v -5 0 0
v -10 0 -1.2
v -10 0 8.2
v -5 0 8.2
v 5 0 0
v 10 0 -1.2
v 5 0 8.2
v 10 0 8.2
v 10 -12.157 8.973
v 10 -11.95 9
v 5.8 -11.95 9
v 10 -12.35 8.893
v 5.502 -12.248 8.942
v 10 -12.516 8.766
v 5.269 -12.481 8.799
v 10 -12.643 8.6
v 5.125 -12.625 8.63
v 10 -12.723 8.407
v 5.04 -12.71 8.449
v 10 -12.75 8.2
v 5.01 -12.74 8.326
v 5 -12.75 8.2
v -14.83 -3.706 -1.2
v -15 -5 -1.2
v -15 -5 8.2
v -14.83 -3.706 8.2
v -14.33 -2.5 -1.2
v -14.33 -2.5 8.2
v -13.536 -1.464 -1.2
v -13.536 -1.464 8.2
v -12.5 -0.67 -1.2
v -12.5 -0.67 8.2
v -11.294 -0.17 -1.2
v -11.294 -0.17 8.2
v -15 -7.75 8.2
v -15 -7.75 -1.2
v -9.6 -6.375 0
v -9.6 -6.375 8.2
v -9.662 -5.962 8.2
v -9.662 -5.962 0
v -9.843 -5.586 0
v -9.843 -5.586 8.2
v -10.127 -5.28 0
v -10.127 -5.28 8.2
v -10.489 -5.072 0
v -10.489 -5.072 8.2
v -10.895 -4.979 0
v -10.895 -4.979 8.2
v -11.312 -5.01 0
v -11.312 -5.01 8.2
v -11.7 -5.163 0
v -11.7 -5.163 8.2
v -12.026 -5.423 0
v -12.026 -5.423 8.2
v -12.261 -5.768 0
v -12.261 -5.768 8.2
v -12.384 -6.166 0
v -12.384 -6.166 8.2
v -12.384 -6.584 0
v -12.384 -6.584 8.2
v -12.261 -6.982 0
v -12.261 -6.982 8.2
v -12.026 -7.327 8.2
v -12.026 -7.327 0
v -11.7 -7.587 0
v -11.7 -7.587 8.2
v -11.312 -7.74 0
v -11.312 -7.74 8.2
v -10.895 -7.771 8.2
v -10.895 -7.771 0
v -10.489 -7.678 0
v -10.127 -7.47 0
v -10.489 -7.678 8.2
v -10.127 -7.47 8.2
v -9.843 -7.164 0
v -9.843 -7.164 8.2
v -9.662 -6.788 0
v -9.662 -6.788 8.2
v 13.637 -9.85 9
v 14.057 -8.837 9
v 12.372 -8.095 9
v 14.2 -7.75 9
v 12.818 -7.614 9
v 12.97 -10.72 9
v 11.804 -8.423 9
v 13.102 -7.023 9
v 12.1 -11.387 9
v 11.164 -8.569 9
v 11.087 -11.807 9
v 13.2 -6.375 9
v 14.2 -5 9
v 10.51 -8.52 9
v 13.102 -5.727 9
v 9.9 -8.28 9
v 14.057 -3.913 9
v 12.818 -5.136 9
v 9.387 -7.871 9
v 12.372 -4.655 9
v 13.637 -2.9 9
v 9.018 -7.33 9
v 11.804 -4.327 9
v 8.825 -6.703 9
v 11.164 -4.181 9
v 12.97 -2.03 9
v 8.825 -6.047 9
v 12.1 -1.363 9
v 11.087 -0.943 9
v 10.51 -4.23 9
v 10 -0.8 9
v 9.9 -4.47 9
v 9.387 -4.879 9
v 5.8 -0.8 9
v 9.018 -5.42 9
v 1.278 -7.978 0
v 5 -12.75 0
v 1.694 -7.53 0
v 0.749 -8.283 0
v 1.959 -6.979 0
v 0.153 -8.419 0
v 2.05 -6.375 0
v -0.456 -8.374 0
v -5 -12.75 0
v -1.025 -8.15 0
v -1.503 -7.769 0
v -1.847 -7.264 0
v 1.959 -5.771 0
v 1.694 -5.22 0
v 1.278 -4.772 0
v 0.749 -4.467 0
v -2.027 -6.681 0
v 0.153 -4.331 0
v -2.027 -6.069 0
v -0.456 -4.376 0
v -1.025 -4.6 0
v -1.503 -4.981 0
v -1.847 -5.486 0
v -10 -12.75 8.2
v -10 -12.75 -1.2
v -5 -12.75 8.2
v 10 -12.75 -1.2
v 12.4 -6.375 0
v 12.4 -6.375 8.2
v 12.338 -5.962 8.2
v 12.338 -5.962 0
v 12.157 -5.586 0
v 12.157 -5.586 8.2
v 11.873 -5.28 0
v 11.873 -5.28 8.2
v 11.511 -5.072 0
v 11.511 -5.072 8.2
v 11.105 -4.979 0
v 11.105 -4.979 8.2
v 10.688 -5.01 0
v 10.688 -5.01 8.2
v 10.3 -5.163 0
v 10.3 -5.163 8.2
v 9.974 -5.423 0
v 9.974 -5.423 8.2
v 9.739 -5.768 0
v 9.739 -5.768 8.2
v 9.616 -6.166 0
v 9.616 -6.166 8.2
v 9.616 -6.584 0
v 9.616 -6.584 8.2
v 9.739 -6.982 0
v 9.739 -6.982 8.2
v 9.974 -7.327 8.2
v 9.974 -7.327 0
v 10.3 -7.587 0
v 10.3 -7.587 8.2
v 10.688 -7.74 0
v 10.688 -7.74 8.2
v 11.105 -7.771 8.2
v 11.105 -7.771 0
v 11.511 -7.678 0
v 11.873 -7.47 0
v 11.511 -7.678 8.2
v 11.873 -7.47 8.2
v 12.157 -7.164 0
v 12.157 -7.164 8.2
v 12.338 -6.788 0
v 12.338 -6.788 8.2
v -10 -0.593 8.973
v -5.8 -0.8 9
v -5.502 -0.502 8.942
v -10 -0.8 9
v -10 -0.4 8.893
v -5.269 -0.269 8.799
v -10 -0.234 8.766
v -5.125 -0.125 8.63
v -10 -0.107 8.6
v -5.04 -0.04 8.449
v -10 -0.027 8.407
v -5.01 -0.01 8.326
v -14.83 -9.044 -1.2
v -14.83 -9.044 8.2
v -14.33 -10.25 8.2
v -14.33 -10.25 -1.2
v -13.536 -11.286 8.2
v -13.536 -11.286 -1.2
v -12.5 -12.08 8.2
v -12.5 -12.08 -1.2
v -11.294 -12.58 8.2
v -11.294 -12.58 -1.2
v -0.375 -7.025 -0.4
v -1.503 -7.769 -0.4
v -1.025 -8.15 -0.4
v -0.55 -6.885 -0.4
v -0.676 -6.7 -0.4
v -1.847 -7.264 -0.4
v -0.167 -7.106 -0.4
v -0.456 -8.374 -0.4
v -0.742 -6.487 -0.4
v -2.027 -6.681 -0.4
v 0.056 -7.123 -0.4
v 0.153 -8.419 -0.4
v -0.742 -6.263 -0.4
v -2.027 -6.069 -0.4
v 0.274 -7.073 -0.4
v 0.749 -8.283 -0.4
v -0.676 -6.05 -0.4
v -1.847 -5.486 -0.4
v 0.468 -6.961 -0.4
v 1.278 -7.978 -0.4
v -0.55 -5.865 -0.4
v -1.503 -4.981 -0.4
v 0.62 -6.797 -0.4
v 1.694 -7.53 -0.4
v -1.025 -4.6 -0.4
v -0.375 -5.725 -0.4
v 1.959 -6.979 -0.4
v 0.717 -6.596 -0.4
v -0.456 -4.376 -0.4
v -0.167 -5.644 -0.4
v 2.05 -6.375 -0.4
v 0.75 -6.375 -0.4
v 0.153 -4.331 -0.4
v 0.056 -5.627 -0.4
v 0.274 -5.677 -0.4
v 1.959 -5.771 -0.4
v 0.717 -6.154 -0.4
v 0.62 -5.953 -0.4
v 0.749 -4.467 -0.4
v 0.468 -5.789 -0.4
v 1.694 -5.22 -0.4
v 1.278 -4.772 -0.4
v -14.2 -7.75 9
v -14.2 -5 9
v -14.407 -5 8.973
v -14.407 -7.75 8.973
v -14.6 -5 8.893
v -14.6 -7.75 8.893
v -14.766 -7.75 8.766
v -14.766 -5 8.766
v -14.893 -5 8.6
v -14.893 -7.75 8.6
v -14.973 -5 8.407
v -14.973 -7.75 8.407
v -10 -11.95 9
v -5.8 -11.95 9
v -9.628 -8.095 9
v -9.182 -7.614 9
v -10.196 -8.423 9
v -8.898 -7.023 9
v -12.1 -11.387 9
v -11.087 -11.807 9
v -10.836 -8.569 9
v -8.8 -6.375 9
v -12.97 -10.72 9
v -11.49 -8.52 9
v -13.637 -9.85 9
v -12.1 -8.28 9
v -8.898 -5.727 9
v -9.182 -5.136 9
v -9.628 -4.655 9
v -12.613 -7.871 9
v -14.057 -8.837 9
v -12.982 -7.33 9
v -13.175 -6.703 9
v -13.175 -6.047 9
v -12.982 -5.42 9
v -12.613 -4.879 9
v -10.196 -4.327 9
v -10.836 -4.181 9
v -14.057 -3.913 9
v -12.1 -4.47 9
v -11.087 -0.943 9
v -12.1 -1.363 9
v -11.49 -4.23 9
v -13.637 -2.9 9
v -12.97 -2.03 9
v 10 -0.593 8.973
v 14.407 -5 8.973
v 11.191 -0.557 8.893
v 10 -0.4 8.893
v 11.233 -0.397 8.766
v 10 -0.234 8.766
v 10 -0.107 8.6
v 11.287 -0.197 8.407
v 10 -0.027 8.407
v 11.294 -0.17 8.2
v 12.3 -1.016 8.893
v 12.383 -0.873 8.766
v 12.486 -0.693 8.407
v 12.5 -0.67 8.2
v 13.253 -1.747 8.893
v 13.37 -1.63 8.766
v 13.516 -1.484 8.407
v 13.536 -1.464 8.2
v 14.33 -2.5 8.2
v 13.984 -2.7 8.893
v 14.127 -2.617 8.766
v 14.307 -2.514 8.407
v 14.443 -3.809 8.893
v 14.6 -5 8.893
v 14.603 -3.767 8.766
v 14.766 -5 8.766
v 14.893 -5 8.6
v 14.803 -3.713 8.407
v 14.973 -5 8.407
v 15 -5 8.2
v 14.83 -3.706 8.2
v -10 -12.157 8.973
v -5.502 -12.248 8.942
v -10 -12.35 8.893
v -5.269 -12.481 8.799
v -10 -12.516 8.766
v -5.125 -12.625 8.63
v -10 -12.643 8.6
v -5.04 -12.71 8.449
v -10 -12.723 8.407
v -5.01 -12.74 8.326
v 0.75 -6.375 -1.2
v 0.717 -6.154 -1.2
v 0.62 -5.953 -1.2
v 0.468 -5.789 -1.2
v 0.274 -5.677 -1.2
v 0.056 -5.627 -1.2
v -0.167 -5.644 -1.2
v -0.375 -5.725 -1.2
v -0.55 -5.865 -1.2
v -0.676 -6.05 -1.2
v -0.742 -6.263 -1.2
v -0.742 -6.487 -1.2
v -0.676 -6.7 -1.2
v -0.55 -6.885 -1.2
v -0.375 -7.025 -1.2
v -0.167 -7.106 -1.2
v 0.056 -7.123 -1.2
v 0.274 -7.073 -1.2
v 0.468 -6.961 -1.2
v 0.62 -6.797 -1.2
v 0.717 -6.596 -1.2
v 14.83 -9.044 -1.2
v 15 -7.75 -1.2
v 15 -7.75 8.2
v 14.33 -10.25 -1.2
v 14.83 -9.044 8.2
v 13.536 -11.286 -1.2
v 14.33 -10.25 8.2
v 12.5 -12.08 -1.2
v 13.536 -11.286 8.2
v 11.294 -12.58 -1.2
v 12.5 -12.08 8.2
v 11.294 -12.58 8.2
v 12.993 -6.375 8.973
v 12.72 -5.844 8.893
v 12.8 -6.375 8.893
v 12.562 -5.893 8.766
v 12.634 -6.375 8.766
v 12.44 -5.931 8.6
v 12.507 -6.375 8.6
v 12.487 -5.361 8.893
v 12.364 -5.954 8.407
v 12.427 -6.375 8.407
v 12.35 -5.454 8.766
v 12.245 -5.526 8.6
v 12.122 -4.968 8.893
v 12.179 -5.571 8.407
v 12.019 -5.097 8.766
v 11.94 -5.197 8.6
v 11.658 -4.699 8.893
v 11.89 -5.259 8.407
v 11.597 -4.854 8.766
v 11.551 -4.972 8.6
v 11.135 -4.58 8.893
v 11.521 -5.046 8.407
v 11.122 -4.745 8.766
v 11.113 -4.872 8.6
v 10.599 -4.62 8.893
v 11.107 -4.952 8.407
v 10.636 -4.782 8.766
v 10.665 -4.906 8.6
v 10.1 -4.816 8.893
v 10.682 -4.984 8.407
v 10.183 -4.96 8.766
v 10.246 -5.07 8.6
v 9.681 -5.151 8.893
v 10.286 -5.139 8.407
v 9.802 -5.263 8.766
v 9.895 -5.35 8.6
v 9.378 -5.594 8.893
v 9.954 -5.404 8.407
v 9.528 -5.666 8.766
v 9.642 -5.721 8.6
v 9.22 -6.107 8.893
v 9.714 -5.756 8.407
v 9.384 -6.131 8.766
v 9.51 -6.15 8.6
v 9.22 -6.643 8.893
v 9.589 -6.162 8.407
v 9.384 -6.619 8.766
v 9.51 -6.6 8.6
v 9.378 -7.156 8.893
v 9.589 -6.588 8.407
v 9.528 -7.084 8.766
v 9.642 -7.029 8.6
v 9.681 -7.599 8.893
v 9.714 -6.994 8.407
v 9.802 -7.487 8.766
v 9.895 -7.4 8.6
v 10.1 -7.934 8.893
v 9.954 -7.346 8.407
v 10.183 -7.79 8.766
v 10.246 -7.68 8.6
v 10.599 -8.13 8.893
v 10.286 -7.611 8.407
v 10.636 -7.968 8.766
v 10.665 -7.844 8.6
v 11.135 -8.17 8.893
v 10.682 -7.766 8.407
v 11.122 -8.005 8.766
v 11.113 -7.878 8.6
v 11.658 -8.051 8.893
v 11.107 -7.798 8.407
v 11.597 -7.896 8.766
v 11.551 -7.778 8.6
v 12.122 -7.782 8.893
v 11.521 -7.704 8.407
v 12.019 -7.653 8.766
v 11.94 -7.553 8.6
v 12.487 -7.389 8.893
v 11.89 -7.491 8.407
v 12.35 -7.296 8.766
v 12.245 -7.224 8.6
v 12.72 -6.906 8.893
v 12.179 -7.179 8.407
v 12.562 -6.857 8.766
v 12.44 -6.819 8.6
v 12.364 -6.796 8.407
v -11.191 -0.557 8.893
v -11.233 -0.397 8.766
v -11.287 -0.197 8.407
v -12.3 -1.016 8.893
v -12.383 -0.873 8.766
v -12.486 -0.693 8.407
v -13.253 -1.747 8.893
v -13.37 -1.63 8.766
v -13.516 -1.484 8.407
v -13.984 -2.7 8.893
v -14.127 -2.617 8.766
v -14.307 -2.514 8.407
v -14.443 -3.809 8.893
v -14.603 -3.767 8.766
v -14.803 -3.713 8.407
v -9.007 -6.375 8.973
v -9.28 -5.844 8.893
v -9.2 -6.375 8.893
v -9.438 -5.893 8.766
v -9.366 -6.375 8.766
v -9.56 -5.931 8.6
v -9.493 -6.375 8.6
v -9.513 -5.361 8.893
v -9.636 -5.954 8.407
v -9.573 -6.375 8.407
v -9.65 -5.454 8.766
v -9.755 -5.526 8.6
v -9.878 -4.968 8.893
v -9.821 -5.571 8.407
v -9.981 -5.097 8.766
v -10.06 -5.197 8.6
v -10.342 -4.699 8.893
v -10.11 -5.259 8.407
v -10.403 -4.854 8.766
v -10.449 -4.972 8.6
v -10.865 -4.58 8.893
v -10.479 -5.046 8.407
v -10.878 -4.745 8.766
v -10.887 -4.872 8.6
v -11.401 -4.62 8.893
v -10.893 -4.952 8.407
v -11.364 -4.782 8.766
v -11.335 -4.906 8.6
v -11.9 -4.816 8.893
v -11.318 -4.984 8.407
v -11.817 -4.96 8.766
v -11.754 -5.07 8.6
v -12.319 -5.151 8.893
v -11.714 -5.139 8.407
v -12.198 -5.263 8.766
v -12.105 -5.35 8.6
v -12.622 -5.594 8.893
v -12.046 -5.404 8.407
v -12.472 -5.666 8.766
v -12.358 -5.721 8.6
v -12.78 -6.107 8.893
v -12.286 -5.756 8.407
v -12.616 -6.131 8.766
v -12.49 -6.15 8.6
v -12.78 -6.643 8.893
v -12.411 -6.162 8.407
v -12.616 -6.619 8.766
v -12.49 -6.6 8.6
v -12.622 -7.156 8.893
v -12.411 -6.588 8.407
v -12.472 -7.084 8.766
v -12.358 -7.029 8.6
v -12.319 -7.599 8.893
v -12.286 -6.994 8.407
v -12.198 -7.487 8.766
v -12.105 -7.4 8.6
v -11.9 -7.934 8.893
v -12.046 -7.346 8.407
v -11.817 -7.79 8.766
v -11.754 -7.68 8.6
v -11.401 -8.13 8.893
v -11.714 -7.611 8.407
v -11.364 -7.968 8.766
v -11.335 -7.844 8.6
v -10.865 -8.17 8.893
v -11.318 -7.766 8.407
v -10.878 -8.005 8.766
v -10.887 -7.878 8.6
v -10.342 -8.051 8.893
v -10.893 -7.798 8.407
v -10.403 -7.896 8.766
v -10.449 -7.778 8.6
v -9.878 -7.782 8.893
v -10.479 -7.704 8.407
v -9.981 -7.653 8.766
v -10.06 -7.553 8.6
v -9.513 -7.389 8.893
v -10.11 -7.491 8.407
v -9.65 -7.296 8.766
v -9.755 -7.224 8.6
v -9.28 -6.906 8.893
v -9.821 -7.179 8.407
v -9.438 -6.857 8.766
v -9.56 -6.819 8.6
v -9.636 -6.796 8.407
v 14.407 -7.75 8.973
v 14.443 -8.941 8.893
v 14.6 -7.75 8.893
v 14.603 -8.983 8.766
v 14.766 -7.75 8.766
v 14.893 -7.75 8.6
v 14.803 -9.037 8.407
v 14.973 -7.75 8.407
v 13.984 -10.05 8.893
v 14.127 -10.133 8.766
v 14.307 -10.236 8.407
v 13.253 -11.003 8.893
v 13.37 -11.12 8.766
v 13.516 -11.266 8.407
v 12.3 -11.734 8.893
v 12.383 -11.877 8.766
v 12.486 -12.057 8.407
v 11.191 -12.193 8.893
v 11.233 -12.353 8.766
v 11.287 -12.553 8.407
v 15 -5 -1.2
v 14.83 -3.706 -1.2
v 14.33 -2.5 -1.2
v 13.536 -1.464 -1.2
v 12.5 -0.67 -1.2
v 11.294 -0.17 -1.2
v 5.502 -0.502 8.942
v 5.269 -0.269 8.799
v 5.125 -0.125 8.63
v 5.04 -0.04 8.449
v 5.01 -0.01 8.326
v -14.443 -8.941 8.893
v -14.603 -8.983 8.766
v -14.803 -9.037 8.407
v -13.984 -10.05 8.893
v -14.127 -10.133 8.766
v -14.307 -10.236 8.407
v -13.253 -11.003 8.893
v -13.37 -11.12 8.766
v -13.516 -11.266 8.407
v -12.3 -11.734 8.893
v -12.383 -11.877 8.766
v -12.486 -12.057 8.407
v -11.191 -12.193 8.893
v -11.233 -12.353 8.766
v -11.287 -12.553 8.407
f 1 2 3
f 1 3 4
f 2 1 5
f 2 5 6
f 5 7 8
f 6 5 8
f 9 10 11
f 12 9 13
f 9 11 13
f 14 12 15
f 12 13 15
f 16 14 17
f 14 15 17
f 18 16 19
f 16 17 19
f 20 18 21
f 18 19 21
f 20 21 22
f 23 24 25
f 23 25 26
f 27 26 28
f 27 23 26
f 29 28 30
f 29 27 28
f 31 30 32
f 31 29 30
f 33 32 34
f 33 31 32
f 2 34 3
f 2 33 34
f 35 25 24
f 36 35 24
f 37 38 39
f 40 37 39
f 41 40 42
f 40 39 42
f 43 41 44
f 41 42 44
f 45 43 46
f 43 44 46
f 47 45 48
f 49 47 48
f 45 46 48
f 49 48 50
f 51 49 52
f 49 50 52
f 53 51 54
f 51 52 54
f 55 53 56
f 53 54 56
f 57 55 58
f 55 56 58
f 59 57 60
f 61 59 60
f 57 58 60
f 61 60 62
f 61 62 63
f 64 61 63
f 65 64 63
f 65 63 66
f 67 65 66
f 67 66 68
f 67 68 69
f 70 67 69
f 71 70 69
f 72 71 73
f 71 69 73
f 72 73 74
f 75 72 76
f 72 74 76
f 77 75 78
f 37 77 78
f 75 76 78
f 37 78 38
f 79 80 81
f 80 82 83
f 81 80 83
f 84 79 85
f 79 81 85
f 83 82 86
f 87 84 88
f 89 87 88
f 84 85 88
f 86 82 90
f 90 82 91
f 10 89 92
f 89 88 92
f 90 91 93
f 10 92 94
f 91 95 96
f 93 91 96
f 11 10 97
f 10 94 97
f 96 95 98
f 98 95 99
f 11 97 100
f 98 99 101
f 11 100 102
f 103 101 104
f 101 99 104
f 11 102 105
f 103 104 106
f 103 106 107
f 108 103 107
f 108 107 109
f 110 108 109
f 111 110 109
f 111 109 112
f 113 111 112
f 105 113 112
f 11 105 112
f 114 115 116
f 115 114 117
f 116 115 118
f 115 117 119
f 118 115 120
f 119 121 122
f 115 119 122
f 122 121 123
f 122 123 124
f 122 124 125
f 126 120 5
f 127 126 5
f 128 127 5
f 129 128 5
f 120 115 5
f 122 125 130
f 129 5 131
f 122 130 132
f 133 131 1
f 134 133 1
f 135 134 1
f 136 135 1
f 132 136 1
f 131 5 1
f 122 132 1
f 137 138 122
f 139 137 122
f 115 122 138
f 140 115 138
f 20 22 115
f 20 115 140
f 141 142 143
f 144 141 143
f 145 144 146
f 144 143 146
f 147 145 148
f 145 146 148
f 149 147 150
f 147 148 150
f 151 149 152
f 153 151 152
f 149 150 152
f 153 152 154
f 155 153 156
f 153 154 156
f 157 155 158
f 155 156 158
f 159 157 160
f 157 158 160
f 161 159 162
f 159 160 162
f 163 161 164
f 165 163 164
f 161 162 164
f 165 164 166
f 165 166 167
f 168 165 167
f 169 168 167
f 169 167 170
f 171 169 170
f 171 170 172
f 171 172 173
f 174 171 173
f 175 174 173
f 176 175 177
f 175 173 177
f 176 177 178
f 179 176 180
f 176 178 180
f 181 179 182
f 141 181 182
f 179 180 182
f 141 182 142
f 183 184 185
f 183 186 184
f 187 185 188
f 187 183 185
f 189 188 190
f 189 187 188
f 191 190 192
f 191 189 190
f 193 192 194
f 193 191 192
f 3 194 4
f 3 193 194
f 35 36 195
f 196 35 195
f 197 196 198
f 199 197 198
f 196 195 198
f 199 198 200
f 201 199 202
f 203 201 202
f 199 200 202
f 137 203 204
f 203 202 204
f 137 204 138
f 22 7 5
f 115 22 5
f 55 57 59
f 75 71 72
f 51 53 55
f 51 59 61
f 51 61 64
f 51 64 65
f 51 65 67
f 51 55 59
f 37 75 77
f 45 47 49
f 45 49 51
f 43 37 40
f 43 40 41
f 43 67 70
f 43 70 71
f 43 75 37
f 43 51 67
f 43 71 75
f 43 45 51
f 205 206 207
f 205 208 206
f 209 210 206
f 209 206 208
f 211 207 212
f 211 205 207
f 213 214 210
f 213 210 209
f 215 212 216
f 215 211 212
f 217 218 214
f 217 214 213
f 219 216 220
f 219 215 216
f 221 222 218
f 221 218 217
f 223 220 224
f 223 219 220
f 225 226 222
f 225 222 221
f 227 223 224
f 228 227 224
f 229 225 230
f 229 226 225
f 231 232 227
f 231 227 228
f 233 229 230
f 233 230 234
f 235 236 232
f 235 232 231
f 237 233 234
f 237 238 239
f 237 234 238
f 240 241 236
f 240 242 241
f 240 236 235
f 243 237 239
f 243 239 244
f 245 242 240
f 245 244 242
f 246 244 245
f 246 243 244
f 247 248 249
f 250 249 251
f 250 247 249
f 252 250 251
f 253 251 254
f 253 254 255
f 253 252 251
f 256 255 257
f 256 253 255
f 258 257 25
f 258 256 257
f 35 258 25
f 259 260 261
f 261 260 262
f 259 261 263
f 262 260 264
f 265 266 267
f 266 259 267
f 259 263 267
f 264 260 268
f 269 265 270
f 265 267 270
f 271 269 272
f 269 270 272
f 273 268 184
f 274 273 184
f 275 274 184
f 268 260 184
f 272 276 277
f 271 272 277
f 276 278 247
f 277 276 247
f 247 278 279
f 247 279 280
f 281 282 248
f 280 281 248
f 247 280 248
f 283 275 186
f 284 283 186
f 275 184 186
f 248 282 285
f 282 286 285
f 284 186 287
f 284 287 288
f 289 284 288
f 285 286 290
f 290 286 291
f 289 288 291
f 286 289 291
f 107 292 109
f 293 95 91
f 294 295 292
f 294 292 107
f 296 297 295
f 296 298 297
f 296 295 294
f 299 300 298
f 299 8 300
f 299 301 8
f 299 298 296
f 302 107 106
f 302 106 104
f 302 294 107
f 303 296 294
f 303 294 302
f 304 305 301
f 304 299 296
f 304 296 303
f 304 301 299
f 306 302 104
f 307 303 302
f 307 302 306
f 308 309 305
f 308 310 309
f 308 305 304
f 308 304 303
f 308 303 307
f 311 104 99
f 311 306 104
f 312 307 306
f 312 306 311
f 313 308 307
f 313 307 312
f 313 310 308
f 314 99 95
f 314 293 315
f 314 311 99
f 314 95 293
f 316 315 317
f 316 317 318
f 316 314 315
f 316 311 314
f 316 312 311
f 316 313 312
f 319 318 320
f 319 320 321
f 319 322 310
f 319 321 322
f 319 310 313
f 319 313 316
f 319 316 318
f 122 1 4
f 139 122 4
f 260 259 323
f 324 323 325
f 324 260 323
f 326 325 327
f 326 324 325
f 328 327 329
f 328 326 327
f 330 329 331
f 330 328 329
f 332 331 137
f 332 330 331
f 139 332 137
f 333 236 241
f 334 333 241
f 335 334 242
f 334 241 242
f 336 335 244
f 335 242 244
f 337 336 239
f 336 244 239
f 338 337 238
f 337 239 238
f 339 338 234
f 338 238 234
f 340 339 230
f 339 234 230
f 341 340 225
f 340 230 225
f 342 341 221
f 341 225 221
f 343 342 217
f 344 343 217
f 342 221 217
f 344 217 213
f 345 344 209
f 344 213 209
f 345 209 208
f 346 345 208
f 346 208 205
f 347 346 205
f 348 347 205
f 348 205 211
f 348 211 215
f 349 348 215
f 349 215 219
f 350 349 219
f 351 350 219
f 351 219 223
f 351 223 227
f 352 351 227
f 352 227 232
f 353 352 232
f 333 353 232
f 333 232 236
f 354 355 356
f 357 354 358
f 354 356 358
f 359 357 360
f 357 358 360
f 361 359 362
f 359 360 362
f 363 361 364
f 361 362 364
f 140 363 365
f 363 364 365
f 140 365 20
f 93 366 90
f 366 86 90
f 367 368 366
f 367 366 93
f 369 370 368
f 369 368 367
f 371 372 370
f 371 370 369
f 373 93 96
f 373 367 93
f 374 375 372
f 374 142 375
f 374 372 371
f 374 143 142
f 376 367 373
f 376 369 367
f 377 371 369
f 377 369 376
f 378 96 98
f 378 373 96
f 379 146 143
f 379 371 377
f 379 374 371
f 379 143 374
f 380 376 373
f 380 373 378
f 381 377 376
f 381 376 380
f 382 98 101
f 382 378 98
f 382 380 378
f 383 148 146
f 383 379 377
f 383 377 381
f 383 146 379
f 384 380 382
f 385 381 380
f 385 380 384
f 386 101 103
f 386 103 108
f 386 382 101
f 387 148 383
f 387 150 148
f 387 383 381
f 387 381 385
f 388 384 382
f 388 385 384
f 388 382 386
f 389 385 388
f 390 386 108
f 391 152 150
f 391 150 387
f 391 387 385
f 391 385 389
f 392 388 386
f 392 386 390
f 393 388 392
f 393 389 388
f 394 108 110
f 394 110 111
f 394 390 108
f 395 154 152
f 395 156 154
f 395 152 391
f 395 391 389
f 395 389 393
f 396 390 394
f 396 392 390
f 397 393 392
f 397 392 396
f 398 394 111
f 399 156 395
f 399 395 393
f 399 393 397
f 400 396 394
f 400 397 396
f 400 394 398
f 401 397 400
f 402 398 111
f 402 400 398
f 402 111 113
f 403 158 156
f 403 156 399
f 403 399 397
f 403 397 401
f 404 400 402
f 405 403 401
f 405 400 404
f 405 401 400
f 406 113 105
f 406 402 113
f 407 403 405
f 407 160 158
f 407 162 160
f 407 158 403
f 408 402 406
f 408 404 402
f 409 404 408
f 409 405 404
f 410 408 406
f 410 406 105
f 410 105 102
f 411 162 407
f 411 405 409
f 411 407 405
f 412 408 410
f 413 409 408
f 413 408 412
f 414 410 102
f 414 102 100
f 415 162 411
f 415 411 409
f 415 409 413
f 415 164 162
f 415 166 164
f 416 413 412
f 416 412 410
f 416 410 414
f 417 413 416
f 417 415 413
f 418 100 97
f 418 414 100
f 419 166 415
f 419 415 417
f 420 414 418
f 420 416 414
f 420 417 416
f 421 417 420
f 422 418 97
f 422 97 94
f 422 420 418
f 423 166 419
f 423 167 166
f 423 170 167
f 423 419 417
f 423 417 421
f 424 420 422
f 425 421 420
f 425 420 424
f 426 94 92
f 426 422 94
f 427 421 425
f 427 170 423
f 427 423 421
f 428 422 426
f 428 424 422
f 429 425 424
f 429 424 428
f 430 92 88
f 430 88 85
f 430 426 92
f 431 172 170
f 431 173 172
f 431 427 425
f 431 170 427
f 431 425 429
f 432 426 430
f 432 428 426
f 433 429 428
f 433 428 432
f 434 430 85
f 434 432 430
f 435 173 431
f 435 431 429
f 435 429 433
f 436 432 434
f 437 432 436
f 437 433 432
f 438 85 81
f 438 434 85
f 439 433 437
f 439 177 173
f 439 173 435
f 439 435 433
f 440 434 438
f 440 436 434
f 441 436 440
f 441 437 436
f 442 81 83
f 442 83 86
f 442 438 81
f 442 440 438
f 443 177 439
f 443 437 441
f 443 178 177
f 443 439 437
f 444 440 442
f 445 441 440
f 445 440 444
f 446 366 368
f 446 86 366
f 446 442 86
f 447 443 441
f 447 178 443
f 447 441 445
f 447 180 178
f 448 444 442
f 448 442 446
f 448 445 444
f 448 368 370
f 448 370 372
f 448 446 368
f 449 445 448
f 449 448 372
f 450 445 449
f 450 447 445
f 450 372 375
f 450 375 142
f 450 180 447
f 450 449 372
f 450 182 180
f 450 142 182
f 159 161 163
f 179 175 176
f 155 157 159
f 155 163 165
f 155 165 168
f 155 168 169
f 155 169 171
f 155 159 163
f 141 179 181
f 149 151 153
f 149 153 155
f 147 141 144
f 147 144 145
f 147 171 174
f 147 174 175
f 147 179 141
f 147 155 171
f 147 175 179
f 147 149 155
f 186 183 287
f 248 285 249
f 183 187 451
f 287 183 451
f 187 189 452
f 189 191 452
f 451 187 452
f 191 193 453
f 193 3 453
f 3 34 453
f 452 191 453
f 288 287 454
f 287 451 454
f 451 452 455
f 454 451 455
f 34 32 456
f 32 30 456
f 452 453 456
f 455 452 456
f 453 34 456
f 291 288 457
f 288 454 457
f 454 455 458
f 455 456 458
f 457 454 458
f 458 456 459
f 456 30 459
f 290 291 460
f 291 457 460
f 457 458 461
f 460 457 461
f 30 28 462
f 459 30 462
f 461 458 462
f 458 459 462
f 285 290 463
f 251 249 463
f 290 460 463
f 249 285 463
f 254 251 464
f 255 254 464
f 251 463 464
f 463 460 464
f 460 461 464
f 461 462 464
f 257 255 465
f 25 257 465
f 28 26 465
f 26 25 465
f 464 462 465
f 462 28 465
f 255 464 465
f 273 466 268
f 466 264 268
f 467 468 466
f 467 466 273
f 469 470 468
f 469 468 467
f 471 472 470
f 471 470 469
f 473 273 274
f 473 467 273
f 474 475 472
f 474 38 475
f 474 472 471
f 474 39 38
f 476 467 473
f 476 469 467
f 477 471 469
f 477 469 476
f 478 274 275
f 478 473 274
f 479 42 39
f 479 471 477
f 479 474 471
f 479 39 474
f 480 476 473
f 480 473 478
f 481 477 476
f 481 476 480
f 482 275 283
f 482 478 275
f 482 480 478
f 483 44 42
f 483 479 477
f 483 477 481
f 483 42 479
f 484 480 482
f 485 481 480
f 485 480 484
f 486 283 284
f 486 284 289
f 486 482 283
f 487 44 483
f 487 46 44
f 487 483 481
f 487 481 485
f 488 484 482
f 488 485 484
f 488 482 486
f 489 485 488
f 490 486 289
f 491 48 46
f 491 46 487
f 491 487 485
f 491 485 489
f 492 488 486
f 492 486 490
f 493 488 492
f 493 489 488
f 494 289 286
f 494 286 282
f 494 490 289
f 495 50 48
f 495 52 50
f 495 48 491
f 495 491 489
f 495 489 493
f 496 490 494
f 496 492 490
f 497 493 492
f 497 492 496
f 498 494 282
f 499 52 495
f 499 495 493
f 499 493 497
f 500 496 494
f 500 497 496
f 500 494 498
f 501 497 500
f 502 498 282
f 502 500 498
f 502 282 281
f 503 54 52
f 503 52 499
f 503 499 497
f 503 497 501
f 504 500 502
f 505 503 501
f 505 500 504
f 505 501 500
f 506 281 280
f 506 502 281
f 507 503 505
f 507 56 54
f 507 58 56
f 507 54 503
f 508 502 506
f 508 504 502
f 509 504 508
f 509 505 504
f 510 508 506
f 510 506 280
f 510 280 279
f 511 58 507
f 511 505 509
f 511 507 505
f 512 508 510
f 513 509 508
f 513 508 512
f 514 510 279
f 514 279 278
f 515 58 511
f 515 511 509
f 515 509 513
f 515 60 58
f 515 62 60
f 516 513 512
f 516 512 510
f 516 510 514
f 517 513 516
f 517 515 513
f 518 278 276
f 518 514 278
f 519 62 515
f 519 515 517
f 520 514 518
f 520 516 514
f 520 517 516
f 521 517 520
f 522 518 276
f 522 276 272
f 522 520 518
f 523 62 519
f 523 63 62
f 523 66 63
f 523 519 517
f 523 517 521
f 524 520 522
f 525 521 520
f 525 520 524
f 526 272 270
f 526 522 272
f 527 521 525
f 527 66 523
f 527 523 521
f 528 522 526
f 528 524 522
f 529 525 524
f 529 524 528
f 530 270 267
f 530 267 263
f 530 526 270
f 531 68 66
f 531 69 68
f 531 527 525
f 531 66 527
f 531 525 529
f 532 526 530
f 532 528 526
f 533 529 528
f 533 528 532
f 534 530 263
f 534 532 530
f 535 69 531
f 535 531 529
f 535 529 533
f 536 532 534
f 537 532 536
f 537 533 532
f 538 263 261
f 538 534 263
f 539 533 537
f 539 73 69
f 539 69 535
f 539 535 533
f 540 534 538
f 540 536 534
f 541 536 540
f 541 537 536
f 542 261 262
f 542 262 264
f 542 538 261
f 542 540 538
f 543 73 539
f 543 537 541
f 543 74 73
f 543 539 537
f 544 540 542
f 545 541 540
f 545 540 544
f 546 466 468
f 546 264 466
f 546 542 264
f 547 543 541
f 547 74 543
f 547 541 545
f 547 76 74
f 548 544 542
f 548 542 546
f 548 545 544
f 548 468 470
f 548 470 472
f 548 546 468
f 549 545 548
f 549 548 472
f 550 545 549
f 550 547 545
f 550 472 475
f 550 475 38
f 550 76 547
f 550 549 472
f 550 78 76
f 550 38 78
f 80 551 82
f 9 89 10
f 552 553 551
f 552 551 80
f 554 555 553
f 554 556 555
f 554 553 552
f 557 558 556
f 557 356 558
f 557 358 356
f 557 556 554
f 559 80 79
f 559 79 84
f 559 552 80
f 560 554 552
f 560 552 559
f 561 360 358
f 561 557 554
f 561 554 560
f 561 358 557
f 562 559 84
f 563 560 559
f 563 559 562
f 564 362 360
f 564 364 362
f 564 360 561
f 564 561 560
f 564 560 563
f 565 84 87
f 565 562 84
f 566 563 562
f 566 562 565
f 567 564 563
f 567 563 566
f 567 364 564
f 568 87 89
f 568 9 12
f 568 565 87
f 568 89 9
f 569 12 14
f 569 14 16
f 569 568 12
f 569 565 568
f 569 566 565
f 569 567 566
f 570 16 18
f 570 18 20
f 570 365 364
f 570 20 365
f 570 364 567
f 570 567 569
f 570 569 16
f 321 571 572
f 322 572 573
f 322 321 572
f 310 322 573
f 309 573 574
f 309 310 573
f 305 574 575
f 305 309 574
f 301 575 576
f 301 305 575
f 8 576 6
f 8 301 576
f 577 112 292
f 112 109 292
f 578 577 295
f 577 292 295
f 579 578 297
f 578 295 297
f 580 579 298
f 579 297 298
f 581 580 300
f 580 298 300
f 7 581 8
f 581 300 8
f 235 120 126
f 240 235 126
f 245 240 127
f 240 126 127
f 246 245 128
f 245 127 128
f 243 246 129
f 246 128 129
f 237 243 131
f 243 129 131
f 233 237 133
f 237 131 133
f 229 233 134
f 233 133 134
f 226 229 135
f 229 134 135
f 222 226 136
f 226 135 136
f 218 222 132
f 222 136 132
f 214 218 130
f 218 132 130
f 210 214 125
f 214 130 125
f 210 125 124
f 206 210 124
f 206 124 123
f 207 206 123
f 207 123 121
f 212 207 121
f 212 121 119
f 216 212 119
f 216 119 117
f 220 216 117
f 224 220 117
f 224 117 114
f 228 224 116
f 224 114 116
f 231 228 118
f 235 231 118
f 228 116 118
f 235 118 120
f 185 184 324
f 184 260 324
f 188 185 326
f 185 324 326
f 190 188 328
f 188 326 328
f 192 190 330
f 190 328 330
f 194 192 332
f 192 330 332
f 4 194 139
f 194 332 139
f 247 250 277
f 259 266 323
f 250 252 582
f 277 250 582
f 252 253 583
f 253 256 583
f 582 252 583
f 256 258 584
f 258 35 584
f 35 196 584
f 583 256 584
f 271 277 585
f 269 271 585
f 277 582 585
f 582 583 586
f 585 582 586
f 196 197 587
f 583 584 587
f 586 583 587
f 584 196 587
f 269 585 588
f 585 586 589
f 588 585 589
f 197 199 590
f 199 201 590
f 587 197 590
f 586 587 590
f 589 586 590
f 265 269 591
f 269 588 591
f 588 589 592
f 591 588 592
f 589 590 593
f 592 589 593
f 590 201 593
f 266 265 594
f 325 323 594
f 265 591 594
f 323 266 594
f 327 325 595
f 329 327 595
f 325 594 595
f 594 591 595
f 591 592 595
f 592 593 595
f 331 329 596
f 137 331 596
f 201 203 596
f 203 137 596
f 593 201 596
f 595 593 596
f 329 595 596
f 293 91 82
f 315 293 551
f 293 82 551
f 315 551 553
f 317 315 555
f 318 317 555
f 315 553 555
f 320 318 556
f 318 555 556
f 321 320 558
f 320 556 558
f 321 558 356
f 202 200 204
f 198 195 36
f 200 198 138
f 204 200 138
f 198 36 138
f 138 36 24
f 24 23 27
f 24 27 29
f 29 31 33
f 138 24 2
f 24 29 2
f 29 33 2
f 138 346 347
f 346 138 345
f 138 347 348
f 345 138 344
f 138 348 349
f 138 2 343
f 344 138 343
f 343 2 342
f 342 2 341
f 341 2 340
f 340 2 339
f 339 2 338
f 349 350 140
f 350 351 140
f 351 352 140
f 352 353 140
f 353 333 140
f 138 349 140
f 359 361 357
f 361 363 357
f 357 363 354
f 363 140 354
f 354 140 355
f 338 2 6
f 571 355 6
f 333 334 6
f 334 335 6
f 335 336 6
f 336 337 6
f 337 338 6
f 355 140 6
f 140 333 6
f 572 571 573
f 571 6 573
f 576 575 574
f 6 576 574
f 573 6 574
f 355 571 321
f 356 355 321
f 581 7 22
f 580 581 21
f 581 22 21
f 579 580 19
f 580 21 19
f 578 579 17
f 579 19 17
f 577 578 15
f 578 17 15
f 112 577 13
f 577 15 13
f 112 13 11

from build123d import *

# Parameters (mm, degrees)
F1_DEPTH = 12.75
F2_R     = 5
F3_R     = 0.75
F4_DEPTH = 1.201
F3_R_2   = 2.05
F5_DEPTH = 0.4
F6_R     = 1.4
F7_DEPTH = 9
F8_R     = 0.8


with BuildPart() as f1:
    # F0 (on Front) → F1 (new body)
    with BuildSketch(Plane.XZ):
        Polygon((5, 0), (0, 0), (-5, 0), (-5, 9), (-15, 9), (-15, -1.2), (0, -1.2), (15, -1.2), (15, 9), (5, 9), align=None)
    extrude(amount=F1_DEPTH)

    # F2
    f2_edges = [f1.edges().sort_by_distance(p)[0] for p in [
        (15, -12.75, 3.9),
        (15, 0, 3.9),
        (-15, -12.75, 3.9),
        (-15, 0, 3.9),
    ]]
    fillet(f2_edges, radius=F2_R)

    # F3 (on face) → F4 (cut, through all)
    with BuildSketch(Plane.XY):
        with Locations((0, -6.375)):
            Circle(F3_R)
    extrude(amount=-F4_DEPTH, mode=Mode.SUBTRACT)

    # F3 (on face) → F5 (cut)
    with BuildSketch(Plane.XY):
        with Locations((0, -6.375)):
            Circle(F3_R_2)
        with Locations((0, -6.375)):
            Circle(F3_R, mode=Mode.SUBTRACT)
    extrude(amount=-F5_DEPTH, mode=Mode.SUBTRACT)

    # F6 (on face) → F7 (cut)
    with BuildSketch(Plane.XY.offset(9)):
        with Locations((11, -6.375)):
            Circle(F6_R)
        with Locations((-11, -6.375)):
            Circle(F6_R)
    extrude(amount=-F7_DEPTH, mode=Mode.SUBTRACT)

    # F8
    f8_edges = [f1.edges().sort_by_distance(p)[0] for p in [
        (-15, -6.375, 9),
        (-13.535534, -1.464466, 9),
        (-13.535534, -11.285534, 9),
        (-7.5, 0, 9),
        (-7.5, -12.75, 9),
        (-5, -6.375, 9),
        (-12.4, -6.375, 9),
        (15, -6.375, 9),
        (13.535534, -1.464466, 9),
        (13.535534, -11.285534, 9),
        (7.5, 0, 9),
        (7.5, -12.75, 9),
        (5, -6.375, 9),
        (9.6, -6.375, 9),
    ]]
    fillet(f8_edges, radius=F8_R)


solid = f1.part
